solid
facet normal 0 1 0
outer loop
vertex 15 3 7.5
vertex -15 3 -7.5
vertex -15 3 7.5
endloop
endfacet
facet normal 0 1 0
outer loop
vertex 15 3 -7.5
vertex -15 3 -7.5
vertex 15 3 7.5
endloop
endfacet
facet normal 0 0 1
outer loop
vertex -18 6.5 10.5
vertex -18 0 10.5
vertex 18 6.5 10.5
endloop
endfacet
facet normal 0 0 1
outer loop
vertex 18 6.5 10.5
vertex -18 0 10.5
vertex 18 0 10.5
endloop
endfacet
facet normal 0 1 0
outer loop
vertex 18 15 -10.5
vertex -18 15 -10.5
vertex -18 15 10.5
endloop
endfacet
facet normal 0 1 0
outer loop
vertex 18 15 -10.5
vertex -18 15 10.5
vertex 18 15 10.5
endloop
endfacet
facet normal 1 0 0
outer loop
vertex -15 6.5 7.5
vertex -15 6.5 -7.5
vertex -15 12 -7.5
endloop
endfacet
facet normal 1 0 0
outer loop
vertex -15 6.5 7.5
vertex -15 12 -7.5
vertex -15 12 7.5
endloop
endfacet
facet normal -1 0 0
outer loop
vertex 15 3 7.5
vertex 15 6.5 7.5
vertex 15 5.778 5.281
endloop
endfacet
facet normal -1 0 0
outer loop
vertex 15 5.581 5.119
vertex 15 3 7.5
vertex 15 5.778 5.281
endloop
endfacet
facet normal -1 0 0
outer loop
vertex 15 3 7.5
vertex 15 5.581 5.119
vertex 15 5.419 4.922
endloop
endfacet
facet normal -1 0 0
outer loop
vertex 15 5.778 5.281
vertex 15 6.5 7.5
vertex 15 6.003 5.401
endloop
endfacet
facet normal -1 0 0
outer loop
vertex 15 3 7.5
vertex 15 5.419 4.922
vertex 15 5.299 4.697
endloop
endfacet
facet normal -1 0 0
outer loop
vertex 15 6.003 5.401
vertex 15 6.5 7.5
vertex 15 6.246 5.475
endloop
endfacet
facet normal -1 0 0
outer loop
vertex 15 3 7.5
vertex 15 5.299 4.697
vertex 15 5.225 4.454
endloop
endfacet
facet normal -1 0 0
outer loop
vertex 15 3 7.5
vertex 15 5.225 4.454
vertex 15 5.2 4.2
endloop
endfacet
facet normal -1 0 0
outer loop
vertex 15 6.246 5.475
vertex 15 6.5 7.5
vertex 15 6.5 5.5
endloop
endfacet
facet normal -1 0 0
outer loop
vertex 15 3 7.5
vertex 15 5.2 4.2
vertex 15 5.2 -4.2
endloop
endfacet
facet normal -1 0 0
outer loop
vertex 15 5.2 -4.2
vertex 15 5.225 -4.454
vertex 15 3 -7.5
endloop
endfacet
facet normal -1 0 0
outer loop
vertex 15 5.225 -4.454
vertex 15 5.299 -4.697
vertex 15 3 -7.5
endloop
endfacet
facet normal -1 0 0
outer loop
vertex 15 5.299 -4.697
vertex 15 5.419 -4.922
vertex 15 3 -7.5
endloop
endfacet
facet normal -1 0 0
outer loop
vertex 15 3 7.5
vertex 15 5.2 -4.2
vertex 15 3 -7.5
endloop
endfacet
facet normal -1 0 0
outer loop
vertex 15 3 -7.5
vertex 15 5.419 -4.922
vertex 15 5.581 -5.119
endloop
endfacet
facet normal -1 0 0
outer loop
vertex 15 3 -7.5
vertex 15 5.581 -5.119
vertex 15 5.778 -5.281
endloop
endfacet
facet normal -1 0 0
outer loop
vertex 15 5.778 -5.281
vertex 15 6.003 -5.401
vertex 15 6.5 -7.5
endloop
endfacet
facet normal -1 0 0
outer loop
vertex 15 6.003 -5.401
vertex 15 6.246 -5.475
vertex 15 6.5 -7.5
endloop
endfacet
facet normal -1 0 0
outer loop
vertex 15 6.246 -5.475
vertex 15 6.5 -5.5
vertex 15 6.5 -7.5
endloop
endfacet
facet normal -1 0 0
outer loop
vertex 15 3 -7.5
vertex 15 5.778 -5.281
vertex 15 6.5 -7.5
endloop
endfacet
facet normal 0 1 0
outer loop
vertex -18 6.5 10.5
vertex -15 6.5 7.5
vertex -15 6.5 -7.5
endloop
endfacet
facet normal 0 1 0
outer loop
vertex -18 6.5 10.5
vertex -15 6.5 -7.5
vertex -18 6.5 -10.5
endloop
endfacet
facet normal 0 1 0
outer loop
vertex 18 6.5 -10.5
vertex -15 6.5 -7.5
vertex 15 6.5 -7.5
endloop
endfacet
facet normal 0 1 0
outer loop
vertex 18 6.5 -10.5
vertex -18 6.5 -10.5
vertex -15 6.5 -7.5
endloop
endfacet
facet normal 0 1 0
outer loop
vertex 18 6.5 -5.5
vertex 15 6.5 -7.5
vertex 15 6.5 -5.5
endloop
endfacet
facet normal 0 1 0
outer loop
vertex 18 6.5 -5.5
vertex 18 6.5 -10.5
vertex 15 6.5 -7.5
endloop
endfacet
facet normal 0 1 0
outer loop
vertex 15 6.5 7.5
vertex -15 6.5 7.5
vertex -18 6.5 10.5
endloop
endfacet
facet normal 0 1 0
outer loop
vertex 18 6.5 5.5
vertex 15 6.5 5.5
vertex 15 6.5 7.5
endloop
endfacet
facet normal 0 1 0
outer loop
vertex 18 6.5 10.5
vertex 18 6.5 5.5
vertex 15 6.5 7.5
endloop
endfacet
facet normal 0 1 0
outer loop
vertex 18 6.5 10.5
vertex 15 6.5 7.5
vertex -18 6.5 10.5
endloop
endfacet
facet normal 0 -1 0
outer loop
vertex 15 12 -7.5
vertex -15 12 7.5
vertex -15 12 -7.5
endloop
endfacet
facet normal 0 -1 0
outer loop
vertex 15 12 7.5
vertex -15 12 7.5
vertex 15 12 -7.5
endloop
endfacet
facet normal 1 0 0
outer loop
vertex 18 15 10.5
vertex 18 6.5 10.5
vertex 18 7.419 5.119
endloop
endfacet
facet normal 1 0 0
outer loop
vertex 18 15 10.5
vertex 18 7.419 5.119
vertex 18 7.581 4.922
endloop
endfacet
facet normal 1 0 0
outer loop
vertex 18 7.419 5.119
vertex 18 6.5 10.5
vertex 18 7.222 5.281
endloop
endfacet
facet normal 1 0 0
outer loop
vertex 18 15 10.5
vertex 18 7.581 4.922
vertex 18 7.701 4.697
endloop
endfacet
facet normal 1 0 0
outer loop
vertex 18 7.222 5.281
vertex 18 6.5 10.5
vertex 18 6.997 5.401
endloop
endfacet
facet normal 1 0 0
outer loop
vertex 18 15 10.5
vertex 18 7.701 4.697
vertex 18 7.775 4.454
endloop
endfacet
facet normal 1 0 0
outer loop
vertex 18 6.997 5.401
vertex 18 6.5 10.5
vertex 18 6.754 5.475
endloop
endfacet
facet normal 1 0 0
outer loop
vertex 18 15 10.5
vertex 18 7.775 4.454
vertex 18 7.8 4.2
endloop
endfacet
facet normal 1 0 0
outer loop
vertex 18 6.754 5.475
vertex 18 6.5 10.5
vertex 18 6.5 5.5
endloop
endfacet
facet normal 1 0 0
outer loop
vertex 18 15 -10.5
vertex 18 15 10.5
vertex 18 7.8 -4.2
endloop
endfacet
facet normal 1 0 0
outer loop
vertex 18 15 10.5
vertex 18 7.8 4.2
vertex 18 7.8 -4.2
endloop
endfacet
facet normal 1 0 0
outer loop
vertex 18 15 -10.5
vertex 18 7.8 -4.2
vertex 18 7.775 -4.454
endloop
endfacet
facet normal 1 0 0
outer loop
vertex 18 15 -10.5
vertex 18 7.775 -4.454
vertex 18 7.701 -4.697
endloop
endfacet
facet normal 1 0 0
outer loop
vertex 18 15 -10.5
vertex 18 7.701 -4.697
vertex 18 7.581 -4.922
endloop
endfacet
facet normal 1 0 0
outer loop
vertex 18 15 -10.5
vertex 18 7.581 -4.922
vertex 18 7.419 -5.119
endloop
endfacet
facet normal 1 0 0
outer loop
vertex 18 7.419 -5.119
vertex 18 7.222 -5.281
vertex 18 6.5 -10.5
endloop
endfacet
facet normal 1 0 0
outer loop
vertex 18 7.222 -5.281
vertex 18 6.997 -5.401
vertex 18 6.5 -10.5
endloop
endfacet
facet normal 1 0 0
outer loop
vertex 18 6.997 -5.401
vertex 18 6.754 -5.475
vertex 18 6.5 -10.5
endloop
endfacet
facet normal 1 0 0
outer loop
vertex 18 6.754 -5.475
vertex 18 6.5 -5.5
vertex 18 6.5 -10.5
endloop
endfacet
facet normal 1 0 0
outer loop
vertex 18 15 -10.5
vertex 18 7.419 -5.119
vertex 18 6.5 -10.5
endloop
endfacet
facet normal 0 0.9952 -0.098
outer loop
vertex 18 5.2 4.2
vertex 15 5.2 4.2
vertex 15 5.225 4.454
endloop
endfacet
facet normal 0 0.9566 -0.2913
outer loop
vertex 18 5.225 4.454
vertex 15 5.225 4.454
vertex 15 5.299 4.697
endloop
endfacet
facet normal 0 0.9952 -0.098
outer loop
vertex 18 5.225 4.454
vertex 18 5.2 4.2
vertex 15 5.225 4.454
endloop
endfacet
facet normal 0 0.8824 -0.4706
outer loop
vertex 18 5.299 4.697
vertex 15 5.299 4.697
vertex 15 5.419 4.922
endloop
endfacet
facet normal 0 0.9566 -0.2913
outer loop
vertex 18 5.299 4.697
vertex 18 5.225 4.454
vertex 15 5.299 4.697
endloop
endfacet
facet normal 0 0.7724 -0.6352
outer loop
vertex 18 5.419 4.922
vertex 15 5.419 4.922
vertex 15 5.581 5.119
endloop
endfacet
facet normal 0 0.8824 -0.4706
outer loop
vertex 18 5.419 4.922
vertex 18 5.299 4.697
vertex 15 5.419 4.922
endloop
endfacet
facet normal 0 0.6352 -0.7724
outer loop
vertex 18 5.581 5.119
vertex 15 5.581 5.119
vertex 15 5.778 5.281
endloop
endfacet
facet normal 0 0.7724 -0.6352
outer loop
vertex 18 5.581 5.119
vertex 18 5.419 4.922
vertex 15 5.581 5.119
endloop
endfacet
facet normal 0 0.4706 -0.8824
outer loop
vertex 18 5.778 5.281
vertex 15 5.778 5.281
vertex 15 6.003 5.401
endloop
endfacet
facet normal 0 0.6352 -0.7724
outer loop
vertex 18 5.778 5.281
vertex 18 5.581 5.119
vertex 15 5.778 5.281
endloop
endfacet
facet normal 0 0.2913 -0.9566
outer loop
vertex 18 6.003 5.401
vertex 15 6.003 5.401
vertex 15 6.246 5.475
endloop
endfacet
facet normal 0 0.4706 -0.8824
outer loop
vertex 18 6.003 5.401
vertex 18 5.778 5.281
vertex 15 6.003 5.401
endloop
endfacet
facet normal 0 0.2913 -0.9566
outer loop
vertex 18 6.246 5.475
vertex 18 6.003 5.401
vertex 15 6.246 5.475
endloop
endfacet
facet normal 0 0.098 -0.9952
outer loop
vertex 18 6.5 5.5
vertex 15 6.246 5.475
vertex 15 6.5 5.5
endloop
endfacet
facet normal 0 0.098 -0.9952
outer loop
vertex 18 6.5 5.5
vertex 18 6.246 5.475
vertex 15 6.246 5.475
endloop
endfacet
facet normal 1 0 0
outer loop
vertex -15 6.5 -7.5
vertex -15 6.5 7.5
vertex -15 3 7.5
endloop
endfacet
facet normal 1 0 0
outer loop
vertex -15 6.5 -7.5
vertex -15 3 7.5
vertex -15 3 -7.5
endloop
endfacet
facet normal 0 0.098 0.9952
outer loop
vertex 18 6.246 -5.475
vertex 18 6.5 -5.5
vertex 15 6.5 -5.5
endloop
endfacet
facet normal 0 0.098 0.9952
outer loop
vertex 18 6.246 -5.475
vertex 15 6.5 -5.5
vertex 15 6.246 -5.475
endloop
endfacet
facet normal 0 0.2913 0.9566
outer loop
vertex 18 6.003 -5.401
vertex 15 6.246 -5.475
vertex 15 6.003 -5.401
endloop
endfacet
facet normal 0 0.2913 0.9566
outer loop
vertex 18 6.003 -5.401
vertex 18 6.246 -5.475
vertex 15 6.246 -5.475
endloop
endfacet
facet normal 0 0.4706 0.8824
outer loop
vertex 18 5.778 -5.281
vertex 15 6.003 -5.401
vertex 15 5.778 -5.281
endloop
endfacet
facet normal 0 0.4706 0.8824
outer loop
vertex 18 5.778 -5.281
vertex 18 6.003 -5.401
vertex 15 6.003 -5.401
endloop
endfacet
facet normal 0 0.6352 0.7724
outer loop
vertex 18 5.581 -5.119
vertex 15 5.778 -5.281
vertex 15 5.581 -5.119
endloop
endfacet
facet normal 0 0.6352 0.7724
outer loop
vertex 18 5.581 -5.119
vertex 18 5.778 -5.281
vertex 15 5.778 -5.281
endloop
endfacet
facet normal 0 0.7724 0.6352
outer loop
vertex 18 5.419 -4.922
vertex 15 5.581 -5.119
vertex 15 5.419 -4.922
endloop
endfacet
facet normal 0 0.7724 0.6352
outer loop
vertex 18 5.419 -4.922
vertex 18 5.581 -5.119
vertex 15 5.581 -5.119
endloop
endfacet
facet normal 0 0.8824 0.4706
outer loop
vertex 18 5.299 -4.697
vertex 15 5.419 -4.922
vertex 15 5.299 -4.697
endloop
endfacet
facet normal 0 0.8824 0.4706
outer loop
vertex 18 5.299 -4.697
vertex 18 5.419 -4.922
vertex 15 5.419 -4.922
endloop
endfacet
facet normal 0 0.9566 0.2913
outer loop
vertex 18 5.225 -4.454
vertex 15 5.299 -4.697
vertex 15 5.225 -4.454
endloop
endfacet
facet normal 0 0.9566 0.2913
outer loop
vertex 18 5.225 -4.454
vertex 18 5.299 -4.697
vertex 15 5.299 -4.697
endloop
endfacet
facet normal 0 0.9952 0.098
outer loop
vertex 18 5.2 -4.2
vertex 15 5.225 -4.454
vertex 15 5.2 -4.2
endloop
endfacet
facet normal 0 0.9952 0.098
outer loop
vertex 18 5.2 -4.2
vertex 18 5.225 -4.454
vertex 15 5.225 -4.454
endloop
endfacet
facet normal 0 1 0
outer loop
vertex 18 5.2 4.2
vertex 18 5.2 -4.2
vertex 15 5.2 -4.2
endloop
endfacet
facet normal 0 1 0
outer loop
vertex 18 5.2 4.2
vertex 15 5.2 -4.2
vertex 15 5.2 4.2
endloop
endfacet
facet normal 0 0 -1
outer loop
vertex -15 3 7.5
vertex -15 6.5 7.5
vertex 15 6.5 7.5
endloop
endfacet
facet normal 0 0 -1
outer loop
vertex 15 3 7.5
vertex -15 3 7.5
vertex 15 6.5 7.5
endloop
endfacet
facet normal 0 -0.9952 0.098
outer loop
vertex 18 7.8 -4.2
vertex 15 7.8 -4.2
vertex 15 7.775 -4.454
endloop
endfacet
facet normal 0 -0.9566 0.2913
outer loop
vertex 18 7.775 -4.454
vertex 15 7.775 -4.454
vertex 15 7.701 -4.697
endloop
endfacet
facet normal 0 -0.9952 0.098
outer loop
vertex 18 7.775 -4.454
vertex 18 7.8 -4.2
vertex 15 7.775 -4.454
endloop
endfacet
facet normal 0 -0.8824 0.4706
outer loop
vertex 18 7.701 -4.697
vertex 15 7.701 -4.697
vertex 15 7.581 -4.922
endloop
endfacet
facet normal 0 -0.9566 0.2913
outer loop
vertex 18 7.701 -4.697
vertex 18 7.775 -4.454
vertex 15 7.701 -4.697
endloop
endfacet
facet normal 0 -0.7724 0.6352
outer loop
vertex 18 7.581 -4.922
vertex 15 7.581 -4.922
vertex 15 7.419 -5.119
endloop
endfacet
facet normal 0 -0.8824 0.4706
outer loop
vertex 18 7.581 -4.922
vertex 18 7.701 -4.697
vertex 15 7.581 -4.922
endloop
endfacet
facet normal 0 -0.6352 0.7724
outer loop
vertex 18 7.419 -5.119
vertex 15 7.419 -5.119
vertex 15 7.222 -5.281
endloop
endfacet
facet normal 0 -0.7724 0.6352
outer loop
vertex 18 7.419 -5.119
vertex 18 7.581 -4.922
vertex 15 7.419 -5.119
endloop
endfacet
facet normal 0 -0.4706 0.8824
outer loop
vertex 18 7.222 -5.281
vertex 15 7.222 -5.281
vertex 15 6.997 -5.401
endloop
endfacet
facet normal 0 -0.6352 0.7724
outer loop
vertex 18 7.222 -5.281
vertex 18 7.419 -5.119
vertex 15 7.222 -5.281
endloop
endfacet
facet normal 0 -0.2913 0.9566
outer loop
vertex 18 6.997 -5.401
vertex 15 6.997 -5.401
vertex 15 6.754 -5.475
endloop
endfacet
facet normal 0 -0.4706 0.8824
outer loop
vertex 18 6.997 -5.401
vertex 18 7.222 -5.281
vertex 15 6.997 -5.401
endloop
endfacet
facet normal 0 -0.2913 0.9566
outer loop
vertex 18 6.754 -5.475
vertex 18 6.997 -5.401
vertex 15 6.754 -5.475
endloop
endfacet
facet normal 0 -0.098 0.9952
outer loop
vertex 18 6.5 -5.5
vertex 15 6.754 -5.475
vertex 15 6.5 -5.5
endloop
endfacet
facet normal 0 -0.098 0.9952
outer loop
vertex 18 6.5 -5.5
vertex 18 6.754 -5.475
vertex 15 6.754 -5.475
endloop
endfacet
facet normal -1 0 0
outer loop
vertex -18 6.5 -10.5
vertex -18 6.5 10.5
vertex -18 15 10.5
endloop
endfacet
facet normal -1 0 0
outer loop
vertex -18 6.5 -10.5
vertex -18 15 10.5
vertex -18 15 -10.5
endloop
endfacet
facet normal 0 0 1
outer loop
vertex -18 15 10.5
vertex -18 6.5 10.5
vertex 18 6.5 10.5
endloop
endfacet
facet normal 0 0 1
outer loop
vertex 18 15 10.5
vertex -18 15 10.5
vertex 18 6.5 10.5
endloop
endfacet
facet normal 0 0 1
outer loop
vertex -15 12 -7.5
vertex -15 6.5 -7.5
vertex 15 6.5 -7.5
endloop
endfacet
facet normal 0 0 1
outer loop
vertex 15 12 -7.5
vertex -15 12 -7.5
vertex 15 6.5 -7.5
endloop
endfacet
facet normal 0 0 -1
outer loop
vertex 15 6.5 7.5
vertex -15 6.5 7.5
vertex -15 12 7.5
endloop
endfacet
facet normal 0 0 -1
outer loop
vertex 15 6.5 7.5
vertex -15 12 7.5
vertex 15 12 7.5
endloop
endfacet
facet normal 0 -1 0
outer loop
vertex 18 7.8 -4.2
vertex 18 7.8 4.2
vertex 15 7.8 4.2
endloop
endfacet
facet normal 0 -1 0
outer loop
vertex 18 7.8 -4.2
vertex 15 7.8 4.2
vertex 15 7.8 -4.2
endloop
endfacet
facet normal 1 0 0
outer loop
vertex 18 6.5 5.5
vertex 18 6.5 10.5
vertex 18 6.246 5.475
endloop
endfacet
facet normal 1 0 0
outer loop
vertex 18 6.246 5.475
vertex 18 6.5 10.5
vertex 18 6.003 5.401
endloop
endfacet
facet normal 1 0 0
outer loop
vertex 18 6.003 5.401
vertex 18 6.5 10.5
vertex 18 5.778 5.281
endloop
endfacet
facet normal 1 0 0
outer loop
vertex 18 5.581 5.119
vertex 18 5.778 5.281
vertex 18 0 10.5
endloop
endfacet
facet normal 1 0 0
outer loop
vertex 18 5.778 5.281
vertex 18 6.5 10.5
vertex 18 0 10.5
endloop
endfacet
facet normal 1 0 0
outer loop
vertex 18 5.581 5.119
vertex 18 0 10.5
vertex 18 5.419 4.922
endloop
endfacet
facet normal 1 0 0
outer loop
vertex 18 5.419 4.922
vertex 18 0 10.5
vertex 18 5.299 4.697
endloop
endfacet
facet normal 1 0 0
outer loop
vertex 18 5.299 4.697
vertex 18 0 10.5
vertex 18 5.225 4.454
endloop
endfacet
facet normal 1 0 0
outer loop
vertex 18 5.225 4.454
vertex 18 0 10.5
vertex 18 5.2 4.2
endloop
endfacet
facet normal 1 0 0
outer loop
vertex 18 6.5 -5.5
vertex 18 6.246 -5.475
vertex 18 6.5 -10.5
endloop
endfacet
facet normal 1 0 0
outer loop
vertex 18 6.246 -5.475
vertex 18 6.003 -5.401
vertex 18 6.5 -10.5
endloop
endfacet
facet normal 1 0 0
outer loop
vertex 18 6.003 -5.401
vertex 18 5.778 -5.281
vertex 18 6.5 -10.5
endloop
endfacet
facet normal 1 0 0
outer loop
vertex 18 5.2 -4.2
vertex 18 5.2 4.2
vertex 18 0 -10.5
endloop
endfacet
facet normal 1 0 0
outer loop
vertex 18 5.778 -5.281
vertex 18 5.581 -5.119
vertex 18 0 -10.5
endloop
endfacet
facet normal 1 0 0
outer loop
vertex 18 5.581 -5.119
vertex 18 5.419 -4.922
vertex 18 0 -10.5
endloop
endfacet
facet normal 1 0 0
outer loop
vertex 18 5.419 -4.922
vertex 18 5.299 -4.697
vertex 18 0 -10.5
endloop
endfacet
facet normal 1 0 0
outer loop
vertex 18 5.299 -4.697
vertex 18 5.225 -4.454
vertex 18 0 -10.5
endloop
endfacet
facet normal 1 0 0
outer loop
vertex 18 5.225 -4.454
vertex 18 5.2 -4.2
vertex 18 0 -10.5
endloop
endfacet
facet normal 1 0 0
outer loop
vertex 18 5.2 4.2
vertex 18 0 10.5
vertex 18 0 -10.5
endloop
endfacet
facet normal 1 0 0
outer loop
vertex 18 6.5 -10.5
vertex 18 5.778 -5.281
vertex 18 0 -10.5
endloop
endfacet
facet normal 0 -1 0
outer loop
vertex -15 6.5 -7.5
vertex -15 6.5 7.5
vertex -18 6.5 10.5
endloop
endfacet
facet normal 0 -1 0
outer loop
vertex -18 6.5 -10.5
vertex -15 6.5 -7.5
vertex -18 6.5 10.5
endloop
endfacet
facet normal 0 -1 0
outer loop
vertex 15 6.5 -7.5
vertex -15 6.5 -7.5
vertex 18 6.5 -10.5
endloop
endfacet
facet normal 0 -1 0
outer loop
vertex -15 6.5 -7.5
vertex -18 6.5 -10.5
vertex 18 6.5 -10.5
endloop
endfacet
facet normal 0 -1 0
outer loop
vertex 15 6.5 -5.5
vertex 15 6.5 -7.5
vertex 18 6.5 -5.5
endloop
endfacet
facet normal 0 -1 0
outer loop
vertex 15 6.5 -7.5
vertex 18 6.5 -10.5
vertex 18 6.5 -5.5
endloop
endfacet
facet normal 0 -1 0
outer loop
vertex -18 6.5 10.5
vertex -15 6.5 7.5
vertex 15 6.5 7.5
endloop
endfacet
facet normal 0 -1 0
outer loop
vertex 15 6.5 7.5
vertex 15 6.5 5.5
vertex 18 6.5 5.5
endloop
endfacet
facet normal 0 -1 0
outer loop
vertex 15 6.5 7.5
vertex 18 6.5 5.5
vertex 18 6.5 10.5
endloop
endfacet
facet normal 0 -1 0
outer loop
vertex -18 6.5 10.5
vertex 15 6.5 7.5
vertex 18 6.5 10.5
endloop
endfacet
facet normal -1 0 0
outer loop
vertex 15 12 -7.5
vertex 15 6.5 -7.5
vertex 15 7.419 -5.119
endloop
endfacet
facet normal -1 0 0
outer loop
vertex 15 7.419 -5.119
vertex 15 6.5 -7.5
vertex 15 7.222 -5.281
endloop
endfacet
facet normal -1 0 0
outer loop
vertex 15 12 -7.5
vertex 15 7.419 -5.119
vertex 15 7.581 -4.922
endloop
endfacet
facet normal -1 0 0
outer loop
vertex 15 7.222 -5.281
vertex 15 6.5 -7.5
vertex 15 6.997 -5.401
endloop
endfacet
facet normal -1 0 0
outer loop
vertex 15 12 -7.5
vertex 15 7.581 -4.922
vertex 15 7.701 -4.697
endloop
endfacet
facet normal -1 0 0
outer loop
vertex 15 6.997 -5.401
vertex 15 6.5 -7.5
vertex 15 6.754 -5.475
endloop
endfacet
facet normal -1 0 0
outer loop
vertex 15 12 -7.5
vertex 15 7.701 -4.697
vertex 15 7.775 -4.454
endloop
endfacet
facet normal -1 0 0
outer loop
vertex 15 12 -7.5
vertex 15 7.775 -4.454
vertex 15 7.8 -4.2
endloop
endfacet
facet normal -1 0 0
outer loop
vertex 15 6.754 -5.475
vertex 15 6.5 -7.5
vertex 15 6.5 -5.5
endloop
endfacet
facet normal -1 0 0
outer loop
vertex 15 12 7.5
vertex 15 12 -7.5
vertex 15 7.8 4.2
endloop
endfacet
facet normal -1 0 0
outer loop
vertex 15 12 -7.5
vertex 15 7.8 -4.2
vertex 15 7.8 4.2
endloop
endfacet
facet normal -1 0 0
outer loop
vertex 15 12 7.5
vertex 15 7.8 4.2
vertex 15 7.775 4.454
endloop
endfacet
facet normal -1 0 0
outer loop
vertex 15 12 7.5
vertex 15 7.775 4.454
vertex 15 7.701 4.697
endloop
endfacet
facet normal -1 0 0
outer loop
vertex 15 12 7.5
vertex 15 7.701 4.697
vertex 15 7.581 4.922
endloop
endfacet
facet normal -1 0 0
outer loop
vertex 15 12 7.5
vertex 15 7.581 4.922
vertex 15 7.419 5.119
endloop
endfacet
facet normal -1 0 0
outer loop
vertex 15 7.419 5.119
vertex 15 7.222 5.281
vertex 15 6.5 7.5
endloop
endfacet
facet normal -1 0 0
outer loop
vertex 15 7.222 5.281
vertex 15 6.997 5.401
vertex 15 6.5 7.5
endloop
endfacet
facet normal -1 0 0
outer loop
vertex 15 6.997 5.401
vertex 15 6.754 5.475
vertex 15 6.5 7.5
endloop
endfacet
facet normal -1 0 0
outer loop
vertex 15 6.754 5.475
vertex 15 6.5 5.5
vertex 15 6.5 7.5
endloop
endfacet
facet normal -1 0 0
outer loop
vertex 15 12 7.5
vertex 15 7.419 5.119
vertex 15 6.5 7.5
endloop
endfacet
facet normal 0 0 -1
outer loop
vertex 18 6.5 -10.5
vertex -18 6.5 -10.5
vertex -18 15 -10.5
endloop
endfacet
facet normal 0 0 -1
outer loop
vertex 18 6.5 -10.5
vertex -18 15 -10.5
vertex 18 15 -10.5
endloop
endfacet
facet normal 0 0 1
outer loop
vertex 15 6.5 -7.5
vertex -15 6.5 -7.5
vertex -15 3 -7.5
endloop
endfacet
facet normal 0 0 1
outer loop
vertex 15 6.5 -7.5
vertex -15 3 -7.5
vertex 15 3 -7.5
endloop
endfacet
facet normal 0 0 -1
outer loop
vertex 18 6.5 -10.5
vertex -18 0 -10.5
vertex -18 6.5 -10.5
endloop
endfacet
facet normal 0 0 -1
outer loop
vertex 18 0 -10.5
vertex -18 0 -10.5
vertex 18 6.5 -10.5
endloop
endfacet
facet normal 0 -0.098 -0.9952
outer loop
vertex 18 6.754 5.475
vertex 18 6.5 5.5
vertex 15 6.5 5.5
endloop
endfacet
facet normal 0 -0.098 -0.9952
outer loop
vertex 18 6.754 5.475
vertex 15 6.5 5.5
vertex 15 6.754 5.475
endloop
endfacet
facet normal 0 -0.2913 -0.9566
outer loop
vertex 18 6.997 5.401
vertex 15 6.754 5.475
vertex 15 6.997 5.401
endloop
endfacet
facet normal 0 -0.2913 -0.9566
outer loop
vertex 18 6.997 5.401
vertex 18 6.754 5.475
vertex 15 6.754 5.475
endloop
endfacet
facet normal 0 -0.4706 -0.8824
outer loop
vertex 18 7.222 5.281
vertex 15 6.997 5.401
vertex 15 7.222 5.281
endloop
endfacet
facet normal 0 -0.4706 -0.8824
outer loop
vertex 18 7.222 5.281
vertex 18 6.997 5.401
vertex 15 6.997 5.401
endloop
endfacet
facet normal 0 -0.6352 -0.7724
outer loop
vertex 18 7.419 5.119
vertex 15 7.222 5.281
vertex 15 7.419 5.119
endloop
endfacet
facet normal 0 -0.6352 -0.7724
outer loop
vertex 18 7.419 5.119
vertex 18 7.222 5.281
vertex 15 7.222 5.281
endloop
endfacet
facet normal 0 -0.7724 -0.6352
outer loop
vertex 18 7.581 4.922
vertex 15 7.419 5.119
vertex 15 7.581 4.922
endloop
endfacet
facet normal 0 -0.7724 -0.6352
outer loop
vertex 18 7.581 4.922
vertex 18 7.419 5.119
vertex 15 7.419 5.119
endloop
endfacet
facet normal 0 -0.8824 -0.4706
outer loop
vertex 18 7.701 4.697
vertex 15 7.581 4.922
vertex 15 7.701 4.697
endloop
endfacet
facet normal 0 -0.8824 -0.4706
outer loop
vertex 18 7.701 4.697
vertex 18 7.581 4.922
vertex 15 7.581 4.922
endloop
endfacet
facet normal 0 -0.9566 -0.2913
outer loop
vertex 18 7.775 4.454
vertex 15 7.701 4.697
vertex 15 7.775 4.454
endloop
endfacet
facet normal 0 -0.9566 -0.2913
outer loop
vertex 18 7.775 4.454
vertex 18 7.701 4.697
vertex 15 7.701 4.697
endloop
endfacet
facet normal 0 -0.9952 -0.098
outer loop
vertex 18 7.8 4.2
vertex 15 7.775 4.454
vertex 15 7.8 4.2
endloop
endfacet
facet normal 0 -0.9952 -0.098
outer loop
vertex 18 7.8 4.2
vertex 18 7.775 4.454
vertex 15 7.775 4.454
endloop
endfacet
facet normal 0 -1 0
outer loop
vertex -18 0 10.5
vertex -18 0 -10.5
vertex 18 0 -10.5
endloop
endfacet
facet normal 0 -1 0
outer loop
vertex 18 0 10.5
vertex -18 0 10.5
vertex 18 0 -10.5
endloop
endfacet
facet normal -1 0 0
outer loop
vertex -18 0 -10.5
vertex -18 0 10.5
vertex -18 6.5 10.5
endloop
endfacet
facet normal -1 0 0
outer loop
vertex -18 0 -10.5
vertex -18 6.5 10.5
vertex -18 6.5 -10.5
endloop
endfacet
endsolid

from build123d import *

# Parameters (mm, degrees)
SKETCH1_W           = 36
SKETCH1_H           = 21
BOSS_EXTRUDE2_DEPTH = 15
CUT_EXTRUDE1_DEPTH  = 15
SKETCH5_W           = 30
SKETCH5_H           = 15
CUT_EXTRUDE2_DEPTH  = 3.5
SKETCH7_W           = 30
SKETCH7_H           = 15
CUT_EXTRUDE3_DEPTH  = 5.5


with BuildPart() as part:
    # Sketch1 → Boss-Extrude2 (new body)
    with BuildSketch(Plane(origin=(0, 0, 0), x_dir=(1, 0, 0), z_dir=(0, 1, 0))):
        Rectangle(SKETCH1_W, SKETCH1_H)
    extrude(amount=BOSS_EXTRUDE2_DEPTH)

    # Sketch2 → Cut-Extrude1 (cut)
    with BuildSketch(Plane(origin=(18, 0, 0), x_dir=(0, 0, -1), z_dir=(1, 0, 0))):
        with BuildLine():
            Line((-4.2, 7.8), (4.2, 7.8))
            ThreePointArc((4.2, 7.8), (5.5, 6.5), (4.2, 5.2))
            Line((4.2, 5.2), (-4.2, 5.2))
            ThreePointArc((-4.2, 5.2), (-5.5, 6.5), (-4.2, 7.8))
        make_face()
    extrude(amount=-CUT_EXTRUDE1_DEPTH, mode=Mode.SUBTRACT)


with BuildPart() as body_2:
    # Split1: the piece on the far side of the plane
    add(part.part)
    split(bisect_by=Plane.ZX.offset(6.5), keep=Keep.BOTTOM)

    # Sketch5 → Cut-Extrude2 (cut)
    with BuildSketch(Plane(origin=(0, 6.5, 0), x_dir=(1, 0, 0), z_dir=(0, 1, 0))):
        Rectangle(SKETCH5_W, SKETCH5_H)
    extrude(amount=-CUT_EXTRUDE2_DEPTH, mode=Mode.SUBTRACT)


with BuildPart() as part_1:
    add(part.part)

    # Split1
    split(bisect_by=Plane.ZX.offset(6.5), keep=Keep.TOP)

    # Sketch7 → Cut-Extrude3 (cut)
    with BuildSketch(Plane.XZ.offset(-6.5)):
        Rectangle(SKETCH7_W, SKETCH7_H)
    extrude(amount=-CUT_EXTRUDE3_DEPTH, mode=Mode.SUBTRACT)


solid = Compound([body_2.part, part_1.part])
